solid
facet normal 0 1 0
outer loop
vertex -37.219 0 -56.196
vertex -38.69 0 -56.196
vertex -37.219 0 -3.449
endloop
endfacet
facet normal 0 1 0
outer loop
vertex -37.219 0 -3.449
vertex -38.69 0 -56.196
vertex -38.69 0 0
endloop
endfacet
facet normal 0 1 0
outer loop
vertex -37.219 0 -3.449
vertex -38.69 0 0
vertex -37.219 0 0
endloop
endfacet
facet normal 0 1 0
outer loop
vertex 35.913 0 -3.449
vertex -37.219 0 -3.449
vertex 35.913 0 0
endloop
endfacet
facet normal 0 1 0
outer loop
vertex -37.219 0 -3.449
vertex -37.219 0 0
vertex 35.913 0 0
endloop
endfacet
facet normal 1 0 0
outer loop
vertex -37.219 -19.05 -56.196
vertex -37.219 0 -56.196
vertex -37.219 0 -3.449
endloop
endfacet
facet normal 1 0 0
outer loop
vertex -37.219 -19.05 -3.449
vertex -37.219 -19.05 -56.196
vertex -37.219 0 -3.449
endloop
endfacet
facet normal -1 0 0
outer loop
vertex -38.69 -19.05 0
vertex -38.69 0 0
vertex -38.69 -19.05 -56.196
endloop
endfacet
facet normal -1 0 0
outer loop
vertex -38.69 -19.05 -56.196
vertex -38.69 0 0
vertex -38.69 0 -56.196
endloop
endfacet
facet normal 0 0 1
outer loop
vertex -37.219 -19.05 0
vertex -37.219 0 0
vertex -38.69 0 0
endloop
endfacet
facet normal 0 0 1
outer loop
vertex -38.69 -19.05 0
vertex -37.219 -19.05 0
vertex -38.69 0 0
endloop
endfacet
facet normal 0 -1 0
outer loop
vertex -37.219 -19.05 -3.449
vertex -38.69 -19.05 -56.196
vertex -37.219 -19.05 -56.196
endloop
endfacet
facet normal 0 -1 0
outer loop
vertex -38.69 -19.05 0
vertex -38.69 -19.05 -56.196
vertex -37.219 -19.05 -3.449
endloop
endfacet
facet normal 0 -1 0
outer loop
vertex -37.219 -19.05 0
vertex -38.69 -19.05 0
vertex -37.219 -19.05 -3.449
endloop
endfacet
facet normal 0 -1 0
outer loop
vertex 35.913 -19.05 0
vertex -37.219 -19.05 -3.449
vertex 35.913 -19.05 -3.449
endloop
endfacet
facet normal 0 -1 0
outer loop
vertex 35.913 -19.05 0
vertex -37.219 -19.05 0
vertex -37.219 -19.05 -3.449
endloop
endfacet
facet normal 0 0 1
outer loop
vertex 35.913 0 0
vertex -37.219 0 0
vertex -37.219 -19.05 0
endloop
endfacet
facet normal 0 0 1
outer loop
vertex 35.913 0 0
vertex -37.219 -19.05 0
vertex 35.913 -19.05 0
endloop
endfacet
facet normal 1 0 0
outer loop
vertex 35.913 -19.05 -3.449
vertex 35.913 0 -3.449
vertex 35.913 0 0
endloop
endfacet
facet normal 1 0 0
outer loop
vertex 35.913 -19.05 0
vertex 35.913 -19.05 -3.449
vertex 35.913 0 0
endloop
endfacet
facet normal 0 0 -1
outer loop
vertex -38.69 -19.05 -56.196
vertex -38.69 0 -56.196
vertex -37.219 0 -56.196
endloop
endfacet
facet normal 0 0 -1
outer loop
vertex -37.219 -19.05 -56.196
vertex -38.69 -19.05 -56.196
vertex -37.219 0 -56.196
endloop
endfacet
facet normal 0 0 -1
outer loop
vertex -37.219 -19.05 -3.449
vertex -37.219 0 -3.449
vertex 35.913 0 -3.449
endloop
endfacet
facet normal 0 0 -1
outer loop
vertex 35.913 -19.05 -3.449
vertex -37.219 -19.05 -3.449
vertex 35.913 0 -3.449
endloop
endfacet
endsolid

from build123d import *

# Parameters (mm, degrees)
F0_W     = 73.131912
F0_H     = 3.448933
F1_DEPTH = 19.05


with BuildPart() as f1:
    # F0 (on Front) → F1 (new body)
    with BuildSketch(Plane.XZ):
        with Locations((-0.653278, -1.724466)):
            Rectangle(F0_W, F0_H)
        Polygon((-37.219234, 0), (-38.690276, 0), (-38.690276, -56.196377), (-37.219234, -56.196377), (-37.219234, -3.448933), align=None)
    extrude(amount=F1_DEPTH)


solid = f1.part
